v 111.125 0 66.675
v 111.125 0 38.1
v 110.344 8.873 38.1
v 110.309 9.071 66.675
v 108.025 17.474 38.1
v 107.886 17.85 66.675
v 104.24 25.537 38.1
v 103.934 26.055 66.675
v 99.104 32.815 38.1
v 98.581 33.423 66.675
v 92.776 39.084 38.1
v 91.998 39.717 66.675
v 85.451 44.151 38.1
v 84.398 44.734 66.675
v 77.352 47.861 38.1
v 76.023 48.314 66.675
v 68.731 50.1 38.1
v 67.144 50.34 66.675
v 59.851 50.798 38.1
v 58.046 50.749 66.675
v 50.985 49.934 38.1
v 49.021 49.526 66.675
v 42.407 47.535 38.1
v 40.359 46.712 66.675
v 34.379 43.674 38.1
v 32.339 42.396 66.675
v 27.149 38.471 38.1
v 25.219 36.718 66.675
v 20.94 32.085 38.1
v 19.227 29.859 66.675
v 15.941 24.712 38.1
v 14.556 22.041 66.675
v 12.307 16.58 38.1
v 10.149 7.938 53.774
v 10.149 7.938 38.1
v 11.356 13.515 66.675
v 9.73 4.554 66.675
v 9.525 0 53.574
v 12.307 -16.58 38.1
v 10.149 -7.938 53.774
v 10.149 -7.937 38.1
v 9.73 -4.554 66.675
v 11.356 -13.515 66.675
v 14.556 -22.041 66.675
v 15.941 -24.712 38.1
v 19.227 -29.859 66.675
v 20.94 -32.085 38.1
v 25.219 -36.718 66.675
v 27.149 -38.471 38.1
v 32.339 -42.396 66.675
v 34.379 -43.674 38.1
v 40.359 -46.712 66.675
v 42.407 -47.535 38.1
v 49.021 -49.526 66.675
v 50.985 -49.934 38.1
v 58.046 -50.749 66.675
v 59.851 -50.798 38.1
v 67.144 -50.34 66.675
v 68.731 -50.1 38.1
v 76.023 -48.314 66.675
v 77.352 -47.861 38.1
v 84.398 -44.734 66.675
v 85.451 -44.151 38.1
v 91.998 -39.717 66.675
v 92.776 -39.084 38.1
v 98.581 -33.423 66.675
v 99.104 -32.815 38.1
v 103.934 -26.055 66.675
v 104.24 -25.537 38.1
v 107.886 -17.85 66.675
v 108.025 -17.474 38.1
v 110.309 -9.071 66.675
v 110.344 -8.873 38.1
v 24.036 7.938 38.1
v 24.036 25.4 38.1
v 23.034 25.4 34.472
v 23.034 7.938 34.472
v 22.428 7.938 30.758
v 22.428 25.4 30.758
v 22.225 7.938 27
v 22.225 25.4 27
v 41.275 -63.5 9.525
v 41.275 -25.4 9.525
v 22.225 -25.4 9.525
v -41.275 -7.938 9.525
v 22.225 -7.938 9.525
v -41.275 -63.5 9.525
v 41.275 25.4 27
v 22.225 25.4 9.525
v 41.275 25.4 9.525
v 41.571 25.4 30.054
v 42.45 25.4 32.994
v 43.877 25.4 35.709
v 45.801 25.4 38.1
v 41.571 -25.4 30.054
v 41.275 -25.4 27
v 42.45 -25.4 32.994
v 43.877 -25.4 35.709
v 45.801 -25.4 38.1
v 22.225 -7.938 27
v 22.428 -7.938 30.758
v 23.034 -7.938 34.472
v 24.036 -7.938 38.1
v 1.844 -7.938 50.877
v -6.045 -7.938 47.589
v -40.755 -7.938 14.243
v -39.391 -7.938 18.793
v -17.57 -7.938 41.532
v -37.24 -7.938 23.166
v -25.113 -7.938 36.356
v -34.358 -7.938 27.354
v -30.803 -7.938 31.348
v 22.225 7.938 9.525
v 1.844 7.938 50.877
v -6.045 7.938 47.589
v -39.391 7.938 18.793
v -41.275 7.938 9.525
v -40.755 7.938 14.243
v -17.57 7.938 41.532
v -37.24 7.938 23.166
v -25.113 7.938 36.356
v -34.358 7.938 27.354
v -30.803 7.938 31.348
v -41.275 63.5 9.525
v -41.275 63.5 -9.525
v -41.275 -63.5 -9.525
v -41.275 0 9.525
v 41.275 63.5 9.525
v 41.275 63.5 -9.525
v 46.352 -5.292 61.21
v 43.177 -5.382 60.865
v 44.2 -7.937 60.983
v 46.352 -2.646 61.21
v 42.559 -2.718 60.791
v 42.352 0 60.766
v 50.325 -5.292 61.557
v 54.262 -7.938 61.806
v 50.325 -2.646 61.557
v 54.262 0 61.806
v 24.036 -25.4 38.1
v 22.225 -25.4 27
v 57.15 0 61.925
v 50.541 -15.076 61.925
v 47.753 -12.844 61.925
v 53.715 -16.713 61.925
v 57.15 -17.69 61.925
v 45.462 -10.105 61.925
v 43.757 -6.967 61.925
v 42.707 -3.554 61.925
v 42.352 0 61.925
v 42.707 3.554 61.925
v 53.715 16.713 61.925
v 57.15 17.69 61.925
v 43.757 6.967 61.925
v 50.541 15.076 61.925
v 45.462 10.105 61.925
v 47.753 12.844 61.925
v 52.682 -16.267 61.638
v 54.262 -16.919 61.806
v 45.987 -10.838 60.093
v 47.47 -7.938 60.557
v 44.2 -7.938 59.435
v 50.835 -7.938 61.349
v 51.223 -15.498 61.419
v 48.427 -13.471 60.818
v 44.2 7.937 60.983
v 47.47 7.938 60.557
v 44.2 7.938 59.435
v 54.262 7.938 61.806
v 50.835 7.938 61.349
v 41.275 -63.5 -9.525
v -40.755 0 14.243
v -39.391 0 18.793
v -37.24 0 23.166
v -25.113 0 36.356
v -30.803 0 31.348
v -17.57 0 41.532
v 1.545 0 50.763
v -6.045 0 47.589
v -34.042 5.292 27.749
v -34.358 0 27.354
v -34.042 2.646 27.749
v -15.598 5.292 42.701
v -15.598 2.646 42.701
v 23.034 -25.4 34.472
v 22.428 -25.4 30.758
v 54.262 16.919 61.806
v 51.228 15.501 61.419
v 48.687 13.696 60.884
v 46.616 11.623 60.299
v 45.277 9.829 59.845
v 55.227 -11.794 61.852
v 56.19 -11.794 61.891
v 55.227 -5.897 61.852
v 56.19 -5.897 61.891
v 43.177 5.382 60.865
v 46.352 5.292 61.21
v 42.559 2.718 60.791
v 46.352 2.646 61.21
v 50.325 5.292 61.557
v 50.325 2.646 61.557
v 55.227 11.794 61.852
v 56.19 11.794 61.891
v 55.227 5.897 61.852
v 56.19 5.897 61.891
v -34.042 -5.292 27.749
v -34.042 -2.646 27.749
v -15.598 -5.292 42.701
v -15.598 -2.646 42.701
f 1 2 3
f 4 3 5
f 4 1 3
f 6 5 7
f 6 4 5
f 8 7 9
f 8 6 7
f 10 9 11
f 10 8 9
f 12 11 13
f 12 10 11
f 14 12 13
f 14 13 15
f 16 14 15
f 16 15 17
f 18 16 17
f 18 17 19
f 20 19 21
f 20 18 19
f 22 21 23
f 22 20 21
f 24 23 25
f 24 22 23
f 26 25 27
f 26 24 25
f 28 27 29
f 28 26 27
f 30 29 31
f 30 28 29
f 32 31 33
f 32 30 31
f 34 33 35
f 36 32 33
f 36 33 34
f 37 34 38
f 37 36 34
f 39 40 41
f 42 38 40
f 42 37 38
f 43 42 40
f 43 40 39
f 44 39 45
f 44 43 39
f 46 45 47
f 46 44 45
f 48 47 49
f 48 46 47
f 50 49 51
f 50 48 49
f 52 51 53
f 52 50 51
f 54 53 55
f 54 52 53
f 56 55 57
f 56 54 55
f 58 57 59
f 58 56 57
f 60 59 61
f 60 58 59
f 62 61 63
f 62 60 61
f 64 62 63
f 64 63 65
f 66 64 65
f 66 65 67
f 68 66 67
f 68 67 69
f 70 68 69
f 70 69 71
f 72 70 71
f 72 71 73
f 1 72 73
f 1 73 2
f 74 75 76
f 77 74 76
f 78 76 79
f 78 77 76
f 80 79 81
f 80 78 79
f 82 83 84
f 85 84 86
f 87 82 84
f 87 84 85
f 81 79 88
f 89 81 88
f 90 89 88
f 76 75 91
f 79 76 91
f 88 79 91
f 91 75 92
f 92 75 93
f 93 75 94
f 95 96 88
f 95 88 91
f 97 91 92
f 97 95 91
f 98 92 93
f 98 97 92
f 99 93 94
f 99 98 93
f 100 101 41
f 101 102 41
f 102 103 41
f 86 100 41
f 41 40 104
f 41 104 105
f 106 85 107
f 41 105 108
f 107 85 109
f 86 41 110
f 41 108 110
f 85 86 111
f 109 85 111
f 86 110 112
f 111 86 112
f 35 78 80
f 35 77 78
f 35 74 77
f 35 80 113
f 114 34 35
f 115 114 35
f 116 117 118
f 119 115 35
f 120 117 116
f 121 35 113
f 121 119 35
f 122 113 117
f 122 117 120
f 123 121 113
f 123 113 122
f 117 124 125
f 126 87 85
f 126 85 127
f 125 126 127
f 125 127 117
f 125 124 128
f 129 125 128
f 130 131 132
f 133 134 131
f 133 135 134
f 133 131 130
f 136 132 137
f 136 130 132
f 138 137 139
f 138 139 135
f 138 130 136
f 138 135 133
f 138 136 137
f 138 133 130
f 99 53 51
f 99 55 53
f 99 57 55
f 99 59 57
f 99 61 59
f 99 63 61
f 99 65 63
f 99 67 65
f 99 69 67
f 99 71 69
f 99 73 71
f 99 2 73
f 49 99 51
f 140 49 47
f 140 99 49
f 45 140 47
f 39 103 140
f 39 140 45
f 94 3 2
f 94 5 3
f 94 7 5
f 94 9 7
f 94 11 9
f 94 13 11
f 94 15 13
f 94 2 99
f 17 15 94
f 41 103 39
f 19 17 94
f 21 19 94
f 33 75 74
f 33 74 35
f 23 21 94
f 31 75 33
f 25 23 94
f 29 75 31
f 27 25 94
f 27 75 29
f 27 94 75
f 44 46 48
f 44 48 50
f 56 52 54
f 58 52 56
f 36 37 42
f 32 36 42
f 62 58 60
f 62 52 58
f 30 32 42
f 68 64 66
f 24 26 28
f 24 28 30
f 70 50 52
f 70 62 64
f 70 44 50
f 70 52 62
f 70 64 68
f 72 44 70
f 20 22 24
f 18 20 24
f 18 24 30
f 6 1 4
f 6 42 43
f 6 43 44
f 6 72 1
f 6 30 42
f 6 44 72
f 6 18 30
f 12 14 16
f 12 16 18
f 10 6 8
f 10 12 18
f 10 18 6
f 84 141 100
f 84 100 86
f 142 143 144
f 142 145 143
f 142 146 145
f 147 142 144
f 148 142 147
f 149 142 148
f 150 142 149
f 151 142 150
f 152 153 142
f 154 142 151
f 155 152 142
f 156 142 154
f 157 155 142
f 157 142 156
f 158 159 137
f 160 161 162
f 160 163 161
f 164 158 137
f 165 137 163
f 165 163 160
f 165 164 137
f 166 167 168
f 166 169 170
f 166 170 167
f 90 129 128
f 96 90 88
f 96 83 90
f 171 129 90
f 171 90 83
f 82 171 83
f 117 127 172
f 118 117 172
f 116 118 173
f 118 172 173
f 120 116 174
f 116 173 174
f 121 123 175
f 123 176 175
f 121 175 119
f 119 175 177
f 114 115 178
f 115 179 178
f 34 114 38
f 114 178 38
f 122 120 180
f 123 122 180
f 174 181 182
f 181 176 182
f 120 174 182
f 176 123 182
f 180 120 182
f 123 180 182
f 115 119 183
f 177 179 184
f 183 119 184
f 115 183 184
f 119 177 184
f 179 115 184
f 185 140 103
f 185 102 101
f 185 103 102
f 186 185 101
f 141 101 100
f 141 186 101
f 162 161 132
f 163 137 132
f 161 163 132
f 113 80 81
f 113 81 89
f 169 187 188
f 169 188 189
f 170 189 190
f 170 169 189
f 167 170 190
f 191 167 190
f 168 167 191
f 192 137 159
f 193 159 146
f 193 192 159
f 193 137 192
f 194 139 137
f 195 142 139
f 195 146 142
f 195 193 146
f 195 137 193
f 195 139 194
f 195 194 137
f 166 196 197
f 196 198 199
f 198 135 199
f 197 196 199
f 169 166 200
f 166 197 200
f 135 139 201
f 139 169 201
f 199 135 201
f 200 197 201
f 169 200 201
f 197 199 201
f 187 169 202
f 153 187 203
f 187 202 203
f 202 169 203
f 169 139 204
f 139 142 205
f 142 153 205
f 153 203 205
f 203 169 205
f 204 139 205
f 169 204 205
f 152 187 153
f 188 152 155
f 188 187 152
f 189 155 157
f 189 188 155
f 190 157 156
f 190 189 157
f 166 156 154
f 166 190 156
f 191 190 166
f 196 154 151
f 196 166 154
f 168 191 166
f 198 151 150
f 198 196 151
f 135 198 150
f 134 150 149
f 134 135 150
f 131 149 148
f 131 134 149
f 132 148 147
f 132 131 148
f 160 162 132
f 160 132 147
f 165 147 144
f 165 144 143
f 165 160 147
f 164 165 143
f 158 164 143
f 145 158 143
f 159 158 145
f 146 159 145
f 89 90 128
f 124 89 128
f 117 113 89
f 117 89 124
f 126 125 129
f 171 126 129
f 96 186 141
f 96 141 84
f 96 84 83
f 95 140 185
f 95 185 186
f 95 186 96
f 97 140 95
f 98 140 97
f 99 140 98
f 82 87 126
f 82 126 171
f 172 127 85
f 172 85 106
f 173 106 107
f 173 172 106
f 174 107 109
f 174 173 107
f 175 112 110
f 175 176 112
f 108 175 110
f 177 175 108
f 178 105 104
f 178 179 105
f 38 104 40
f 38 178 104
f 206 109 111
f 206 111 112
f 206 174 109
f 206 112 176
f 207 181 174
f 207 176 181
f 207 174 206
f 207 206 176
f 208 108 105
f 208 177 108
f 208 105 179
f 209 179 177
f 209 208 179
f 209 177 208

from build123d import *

# Parameters (mm, degrees)
F1_DEPTH = 63.5
F0_W     = 17.9729990546
F0_H     = 19.05
F2_DEPTH = 25.4
F3_DEPTH = 7.9375


with BuildPart() as f1:
    # F0 (on Front) → F1 (new body, symmetric)
    with BuildSketch(Plane.XZ):
        Polygon((22.225, 9.525), (-41.275, 9.525), (-41.275, -9.525), (41.275, -9.525), (41.275, 9.525), align=None)
    extrude(amount=F1_DEPTH, both=True)

    # F0 (on Front) → F2 (join, symmetric)
    with BuildSketch(Plane.XZ):
        with BuildLine():
            Line((22.225, 27.0002), (22.225, 9.525))
            Line((22.225, 9.525), (41.275, 9.525))
            Line((41.275, 9.525), (41.275, 27.0002))
            ThreePointArc((41.275, 27.0002), (45.9246798487, 38.2255201513), (57.15, 42.8752))
            Line((57.15, 42.8752), (60.325, 42.8752))
            Line((60.325, 42.8752), (60.325, 61.9252))
            Line((60.325, 61.9252), (57.15, 61.9252))
            add(Edge.make_bspline(
                [(54.2615577604, 61.8055519797), (55.2288783664, 61.8546366141), (56.1919158349, 61.8945538675), (57.15, 61.9252)],
                knots=[109.0649355022, 109.0649355022, 109.0649355022, 109.0649355022, 111.5045361635, 111.5045361635, 111.5045361635, 111.5045361635], degree=3))
            ThreePointArc((54.2615577604, 61.8055519797), (31.4533614045, 50.6526499765), (22.225, 27.0002))
        make_face()
        with Locations((69.3114995273, 52.4002)):
            Rectangle(F0_W, F0_H)
    extrude(amount=F2_DEPTH, both=True)

    # F0 (on Front) → F3 (join, symmetric)
    with BuildSketch(Plane.XZ):
        with BuildLine():
            add(Edge.make_bspline(
                [(-41.275, 9.525), (-40.7890449991, 39.0945706255), (11.0164639317, 59.6111713264), (54.2615577604, 61.8055519797)],
                knots=[0, 0, 0, 0, 109.0649355022, 109.0649355022, 109.0649355022, 109.0649355022], degree=3))
            Line((-41.275, 9.525), (22.225, 9.525))
            Line((22.225, 9.525), (22.225, 27.0002))
            ThreePointArc((22.225, 27.0002), (31.4533614045, 50.6526499765), (54.2615577604, 61.8055519797))
        make_face()
    extrude(amount=F3_DEPTH, both=True)

    # F0 (on Front) → F4 (revolve)
    with BuildSketch(Plane.XZ):
        Polygon((60.325, 66.675), (60.325, 61.9252), (78.2979990546, 61.9252), (78.2979990546, 42.8752), (60.325, 42.8752), (60.325, 38.1), (111.125, 38.1), (111.125, 66.675), align=None)
    revolve(axis=Axis((60.325, 0, 52.3875), (0, 0, 1)))


solid = f1.part
